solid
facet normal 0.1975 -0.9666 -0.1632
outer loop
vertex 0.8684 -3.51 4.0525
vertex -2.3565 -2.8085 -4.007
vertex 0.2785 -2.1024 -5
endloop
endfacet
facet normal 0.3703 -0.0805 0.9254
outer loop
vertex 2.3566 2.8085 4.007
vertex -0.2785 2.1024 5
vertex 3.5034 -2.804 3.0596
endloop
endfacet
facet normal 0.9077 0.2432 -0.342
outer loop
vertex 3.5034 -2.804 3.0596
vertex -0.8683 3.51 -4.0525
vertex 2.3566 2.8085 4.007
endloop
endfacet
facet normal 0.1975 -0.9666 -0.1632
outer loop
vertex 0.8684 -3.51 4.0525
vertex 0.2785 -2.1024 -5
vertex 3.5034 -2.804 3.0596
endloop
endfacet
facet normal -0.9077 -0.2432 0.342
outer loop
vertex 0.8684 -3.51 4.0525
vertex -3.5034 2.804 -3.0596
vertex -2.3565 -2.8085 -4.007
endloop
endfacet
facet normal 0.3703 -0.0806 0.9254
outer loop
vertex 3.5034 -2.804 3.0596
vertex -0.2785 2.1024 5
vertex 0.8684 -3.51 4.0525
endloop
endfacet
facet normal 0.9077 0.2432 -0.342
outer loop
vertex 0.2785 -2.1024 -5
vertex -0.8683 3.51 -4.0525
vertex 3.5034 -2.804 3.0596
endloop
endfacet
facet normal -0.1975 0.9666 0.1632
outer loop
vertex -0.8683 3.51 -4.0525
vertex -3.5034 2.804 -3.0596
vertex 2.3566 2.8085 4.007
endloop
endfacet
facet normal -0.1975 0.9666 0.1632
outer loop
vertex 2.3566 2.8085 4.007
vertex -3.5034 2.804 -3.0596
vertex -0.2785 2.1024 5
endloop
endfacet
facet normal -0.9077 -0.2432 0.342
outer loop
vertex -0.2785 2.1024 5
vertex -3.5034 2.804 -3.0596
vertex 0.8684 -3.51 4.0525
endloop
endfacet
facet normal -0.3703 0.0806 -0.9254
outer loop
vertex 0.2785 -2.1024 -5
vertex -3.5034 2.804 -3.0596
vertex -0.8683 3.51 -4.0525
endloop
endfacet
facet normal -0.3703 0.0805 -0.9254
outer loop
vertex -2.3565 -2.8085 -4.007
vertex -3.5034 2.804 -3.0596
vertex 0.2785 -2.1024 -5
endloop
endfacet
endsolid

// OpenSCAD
// Begin.
union() {
rotate([100, 20.0001, 15])
translate([1.00136e-05, 5.00679e-06, 5.00679e-06])
cube(size = [2.90309, 8.70911, 5.80626], center = true);

rotate([100, 20.0001, 15])
translate([1.00136e-05, 5.00679e-06, 5.00679e-06])
cube(size = [2.90309, 8.70911, 5.80626], center = true);
}
// End.
